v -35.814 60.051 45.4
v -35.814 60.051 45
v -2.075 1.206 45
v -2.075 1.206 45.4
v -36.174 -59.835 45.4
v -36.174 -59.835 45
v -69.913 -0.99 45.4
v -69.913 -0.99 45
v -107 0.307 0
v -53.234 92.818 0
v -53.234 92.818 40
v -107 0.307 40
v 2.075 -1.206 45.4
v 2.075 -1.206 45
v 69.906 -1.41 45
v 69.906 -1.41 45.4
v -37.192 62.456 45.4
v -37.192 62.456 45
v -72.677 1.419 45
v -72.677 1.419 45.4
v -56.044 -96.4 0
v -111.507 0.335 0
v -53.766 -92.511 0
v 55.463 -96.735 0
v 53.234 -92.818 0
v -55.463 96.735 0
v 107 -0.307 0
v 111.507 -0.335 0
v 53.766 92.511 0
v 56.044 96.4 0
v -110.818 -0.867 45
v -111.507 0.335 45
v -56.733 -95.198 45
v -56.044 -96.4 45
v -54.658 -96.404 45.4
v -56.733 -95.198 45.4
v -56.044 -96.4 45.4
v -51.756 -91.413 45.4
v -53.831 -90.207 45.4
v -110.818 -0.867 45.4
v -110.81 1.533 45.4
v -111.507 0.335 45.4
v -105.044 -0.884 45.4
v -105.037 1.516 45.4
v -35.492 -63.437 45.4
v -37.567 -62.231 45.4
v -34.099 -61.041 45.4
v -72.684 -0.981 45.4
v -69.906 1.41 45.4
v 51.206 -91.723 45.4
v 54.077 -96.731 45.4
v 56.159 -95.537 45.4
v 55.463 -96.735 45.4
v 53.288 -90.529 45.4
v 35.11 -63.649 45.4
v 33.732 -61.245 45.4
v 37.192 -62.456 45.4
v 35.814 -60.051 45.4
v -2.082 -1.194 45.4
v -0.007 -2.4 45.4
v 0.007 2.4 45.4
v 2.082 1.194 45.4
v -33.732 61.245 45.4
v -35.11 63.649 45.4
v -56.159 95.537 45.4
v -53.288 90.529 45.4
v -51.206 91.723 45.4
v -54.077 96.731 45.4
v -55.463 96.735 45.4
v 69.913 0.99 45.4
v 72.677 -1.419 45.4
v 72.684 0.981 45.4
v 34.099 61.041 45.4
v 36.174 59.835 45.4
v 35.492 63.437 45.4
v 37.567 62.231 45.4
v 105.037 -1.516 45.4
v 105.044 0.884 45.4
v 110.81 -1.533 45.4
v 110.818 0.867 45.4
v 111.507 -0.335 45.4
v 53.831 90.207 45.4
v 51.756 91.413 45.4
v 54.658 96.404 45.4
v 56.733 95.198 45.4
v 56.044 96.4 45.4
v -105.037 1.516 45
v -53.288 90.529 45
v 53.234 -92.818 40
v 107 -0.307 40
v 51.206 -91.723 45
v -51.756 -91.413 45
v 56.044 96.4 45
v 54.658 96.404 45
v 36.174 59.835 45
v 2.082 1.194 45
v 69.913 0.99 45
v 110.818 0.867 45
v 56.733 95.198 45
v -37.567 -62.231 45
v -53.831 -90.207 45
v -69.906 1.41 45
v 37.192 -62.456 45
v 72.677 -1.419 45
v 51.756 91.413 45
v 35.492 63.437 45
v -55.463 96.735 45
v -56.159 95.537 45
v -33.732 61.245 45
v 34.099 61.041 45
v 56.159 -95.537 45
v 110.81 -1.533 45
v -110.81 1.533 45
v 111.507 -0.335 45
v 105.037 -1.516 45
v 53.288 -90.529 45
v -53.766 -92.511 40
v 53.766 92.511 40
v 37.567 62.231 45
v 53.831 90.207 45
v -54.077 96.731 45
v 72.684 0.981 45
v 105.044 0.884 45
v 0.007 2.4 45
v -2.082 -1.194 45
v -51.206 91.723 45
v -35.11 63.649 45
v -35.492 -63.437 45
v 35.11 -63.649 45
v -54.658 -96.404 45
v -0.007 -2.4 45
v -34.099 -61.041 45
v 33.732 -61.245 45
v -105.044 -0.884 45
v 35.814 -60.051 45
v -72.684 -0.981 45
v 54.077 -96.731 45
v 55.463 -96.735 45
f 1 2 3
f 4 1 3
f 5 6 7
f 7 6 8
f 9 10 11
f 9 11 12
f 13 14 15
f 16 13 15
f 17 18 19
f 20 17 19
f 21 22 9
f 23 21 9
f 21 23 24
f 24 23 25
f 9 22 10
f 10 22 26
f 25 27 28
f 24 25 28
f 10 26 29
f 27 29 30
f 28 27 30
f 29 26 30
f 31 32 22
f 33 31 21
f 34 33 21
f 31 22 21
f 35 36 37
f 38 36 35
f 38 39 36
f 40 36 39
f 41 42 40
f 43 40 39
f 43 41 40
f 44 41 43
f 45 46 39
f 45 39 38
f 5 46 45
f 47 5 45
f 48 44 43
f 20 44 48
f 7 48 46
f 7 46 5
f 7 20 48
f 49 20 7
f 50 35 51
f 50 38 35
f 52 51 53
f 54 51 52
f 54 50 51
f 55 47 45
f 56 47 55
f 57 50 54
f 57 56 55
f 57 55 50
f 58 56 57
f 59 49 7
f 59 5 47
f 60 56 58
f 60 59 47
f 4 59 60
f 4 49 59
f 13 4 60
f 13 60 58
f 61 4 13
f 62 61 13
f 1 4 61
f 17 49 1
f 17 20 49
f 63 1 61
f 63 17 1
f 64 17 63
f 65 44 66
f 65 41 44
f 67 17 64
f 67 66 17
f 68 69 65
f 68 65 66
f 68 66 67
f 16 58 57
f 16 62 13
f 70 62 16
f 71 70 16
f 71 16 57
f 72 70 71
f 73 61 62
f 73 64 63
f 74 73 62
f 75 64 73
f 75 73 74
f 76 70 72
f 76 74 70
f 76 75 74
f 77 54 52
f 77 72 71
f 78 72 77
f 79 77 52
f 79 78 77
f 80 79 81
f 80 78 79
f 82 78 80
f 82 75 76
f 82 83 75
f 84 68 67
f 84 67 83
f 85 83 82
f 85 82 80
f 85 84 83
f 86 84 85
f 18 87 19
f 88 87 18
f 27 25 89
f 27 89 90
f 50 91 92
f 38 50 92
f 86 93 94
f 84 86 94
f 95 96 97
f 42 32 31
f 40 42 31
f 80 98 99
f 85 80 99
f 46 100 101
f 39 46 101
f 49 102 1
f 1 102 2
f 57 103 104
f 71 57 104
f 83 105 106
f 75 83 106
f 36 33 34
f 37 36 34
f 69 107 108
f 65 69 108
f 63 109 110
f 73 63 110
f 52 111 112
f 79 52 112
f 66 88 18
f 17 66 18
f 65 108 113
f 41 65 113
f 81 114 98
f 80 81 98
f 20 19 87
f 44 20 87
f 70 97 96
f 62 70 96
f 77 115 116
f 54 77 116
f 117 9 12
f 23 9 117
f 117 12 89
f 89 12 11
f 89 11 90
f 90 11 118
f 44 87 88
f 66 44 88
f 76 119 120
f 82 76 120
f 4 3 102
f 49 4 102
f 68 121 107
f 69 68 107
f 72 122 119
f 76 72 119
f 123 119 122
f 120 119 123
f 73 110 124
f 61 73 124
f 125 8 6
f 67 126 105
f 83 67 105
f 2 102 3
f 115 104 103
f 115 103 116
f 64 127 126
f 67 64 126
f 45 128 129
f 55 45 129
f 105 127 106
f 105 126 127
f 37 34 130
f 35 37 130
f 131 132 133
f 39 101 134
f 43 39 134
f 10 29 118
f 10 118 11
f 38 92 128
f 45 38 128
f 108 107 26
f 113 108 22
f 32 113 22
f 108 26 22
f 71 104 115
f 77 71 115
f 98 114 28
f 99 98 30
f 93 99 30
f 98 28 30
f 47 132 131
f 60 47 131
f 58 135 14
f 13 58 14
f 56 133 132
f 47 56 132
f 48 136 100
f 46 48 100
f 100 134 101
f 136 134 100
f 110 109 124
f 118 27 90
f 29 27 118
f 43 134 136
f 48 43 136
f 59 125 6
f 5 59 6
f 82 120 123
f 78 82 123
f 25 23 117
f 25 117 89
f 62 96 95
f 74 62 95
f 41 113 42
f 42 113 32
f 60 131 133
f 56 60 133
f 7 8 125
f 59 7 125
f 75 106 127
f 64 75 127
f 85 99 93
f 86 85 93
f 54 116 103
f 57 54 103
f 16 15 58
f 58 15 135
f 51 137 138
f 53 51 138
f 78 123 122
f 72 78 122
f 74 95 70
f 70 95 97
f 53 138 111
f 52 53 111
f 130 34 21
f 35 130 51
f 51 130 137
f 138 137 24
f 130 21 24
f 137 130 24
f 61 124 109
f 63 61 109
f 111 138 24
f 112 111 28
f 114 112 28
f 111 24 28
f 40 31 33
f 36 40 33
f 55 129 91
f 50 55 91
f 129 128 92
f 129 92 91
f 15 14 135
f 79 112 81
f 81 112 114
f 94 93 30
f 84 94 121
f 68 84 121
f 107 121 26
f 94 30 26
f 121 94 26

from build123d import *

# Parameters (mm, degrees)
SALIENTE_EXTRUIR1_DEPTH = 40
SALIENTE_EXTRUIR2_DEPTH = 5
SALIENTE_EXTRUIR3_DEPTH = 0.4


with BuildPart() as part:
    # Croquis1 → Saliente-Extruir1 (new body)
    with BuildSketch(Plane.XY):
        Polygon((-55.463005259, 96.735362128), (-111.506783676, 0.33530954), (-56.043778418, -96.400052588), (55.463005259, -96.735362128), (111.506783676, -0.33530954), (56.043778418, 96.400052588), align=None)
        Polygon((53.766067764, 92.51110391), (-53.233932236, 92.8183325), (-107, 0.30722859), (-53.766067764, -92.51110391), (53.233932236, -92.8183325), (107, -0.30722859), align=None, mode=Mode.SUBTRACT)
    extrude(amount=SALIENTE_EXTRUIR1_DEPTH)

    # Croquis2 → Saliente-Extruir2 (add)
    with BuildSketch(Plane.XY.offset(40)):
        Polygon((111.506783676, -0.33530954), (56.043778418, 96.400052588), (-55.463005259, 96.735362128), (-111.506783676, 0.33530954), (-56.043778418, -96.400052588), (55.463005259, -96.735362128), align=None)
    extrude(amount=SALIENTE_EXTRUIR2_DEPTH)

    # Croquis4 → Saliente-Extruir3 (add)
    with BuildSketch(Plane.XY.offset(45)):
        Polygon((-56.159430926, 95.537450908), (-110.810358009, 1.533220759), (-105.03688142, 1.515859468), (-53.287727951, 90.528792869), align=None)
        Polygon((-111.506783676, 0.33530954), (-110.817574962, -0.86676839), (-105.044098374, -0.884129681), (-105.733307088, 0.317948248), (-105.03688142, 1.515859468), (-110.810358009, 1.533220759), align=None)
        Polygon((-105.044098374, -0.884129681), (-110.817574962, -0.86676839), (-56.732987132, -95.197974658), (-53.831213518, -90.20667791), align=None)
        Polygon((-105.733307088, 0.317948248), (-105.044098374, -0.884129681), (-72.68406869, -0.981438798), (-73.373277404, 0.220639131), (-72.676851737, 1.418550351), (-105.03688142, 1.515859468), align=None)
        Polygon((-55.463005259, 96.735362128), (-56.159430926, 95.537450908), (-53.287727951, 90.528792869), (-52.591302284, 91.726704088), (-51.205667902, 91.722537378), (-54.077370877, 96.731195418), align=None)
        Polygon((54.658144036, 96.404219298), (-54.077370877, 96.731195418), (-51.205667902, 91.722537378), (51.756370423, 91.41292255), align=None)
        Polygon((-52.591302284, 91.726704088), (-53.287727951, 90.528792869), (-37.191985277, 62.455530537), (-36.495559609, 63.653441757), (-35.109925228, 63.649275047), (-51.205667902, 91.722537378), align=None)
        Polygon((56.043778418, 96.400052588), (54.658144036, 96.404219298), (51.756370423, 91.41292255), (53.142004804, 91.40875584), (53.831213518, 90.20667791), (56.732987132, 95.197974658), align=None)
        Polygon((53.142004804, 91.40875584), (51.756370423, 91.41292255), (35.492083414, 63.436969335), (36.877717795, 63.432802625), (37.566926509, 62.230724696), (53.831213518, 90.20667791), align=None)
        Polygon((110.817574962, 0.86676839), (56.732987132, 95.197974658), (53.831213518, 90.20667791), (105.044098374, 0.884129681), align=None)
        Polygon((72.676851737, -1.418550351), (105.03688142, -1.515859468), (105.733307088, -0.317948248), (105.044098374, 0.884129681), (72.68406869, 0.981438798), (73.373277404, -0.220639131), align=None)
        Polygon((105.03688142, -1.515859468), (110.810358009, -1.533220759), (111.506783676, -0.33530954), (110.817574962, 0.86676839), (105.044098374, 0.884129681), (105.733307088, -0.317948248), align=None)
        Polygon((53.287727951, -90.528792869), (56.159430926, -95.537450908), (110.810358009, -1.533220759), (105.03688142, -1.515859468), align=None)
        Polygon((-53.831213518, -90.20667791), (-56.732987132, -95.197974658), (-56.043778418, -96.400052588), (-54.658144036, -96.404219298), (-51.756370423, -91.41292255), (-53.142004804, -91.40875584), align=None)
        Polygon((-51.756370423, -91.41292255), (-54.658144036, -96.404219298), (54.077370877, -96.731195418), (51.205667902, -91.722537378), align=None)
        Polygon((51.205667902, -91.722537378), (54.077370877, -96.731195418), (55.463005259, -96.735362128), (56.159430926, -95.537450908), (53.287727951, -90.528792869), (52.591302284, -91.726704088), align=None)
        Polygon((35.109925228, -63.649275047), (51.205667902, -91.722537378), (52.591302284, -91.726704088), (53.287727951, -90.528792869), (37.191985277, -62.455530537), (36.495559609, -63.653441757), align=None)
        Polygon((-37.566926509, -62.230724696), (-53.831213518, -90.20667791), (-53.142004804, -91.40875584), (-51.756370423, -91.41292255), (-35.492083414, -63.436969335), (-36.877717795, -63.432802625), align=None)
        Polygon((-36.174075174, -59.834902257), (-37.566926509, -62.230724696), (-36.877717795, -63.432802625), (-35.492083414, -63.436969335), (-34.099232079, -61.041146896), (-35.48486646, -61.036980186), align=None)
        Polygon((-34.099232079, -61.041146896), (-35.492083414, -63.436969335), (35.109925228, -63.649275047), (33.7315078, -61.245119188), align=None)
        Polygon((-69.912799928, -0.989772218), (-72.68406869, -0.981438798), (-37.566926509, -62.230724696), (-36.174075174, -59.834902257), align=None)
        Polygon((33.7315078, -61.245119188), (35.109925228, -63.649275047), (36.495559609, -63.653441757), (37.191985277, -62.455530537), (35.813567849, -60.051374678), (35.117142181, -61.249285898), align=None)
        Polygon((2.074843095, -1.206244639), (0.689208714, -1.20207793), (-0.007216953, -2.399989149), (33.7315078, -61.245119188), (35.117142181, -61.249285898), (35.813567849, -60.051374678), align=None)
        Polygon((-0.696425667, -1.19791122), (-2.082060049, -1.19374451), (-36.174075174, -59.834902257), (-35.48486646, -61.036980186), (-34.099232079, -61.041146896), (-0.007216953, -2.399989149), align=None)
        Polygon((72.676851737, -1.418550351), (69.905582974, -1.410216931), (35.813567849, -60.051374678), (37.191985277, -62.455530537), align=None)
        Polygon((70.602008642, -0.212305711), (69.905582974, -1.410216931), (72.676851737, -1.418550351), (73.373277404, -0.220639131), (72.68406869, 0.981438798), (69.912799928, 0.989772218), align=None)
        Polygon((36.174075174, 59.834902257), (69.912799928, 0.989772218), (72.68406869, 0.981438798), (37.566926509, 62.230724696), align=None)
        Polygon((0.689208714, -1.20207793), (-0.696425667, -1.19791122), (-0.007216953, -2.399989149), align=None)
        Polygon((-1.385634381, 0.00416671), (-2.082060049, -1.19374451), (-0.696425667, -1.19791122), align=None)
        Polygon((-1.385634381, 0.00416671), (-0.696425667, -1.19791122), (0.689208714, -1.20207793), (1.385634381, -0.00416671), (0.696425667, 1.19791122), (-0.689208714, 1.20207793), align=None)
        Polygon((-2.074843095, 1.206244639), (-1.385634381, 0.00416671), (-0.689208714, 1.20207793), align=None)
        Polygon((0.007216953, 2.399989149), (-0.689208714, 1.20207793), (0.696425667, 1.19791122), align=None)
        Polygon((0.696425667, 1.19791122), (1.385634381, -0.00416671), (2.082060049, 1.19374451), align=None)
        Polygon((1.385634381, -0.00416671), (0.689208714, -1.20207793), (2.074843095, -1.206244639), align=None)
        Polygon((1.385634381, -0.00416671), (2.074843095, -1.206244639), (69.905582974, -1.410216931), (70.602008642, -0.212305711), (69.912799928, 0.989772218), (2.082060049, 1.19374451), align=None)
        Polygon((-70.602008642, 0.212305711), (-69.912799928, -0.989772218), (-2.082060049, -1.19374451), (-1.385634381, 0.00416671), (-2.074843095, 1.206244639), (-69.905582974, 1.410216931), align=None)
        Polygon((-35.813567849, 60.051374678), (-2.074843095, 1.206244639), (-0.689208714, 1.20207793), (0.007216953, 2.399989149), (-33.7315078, 61.245119188), (-35.117142181, 61.249285898), align=None)
        Polygon((0.007216953, 2.399989149), (0.696425667, 1.19791122), (2.082060049, 1.19374451), (36.174075174, 59.834902257), (35.48486646, 61.036980186), (34.099232079, 61.041146896), align=None)
        Polygon((35.492083414, 63.436969335), (34.099232079, 61.041146896), (35.48486646, 61.036980186), (36.174075174, 59.834902257), (37.566926509, 62.230724696), (36.877717795, 63.432802625), align=None)
        Polygon((35.492083414, 63.436969335), (-35.109925228, 63.649275047), (-33.7315078, 61.245119188), (34.099232079, 61.041146896), align=None)
        Polygon((-36.495559609, 63.653441757), (-37.191985277, 62.455530537), (-35.813567849, 60.051374678), (-35.117142181, 61.249285898), (-33.7315078, 61.245119188), (-35.109925228, 63.649275047), align=None)
        Polygon((-37.191985277, 62.455530537), (-72.676851737, 1.418550351), (-69.905582974, 1.410216931), (-35.813567849, 60.051374678), align=None)
        Polygon((-73.373277404, 0.220639131), (-72.68406869, -0.981438798), (-69.912799928, -0.989772218), (-70.602008642, 0.212305711), (-69.905582974, 1.410216931), (-72.676851737, 1.418550351), align=None)
    extrude(amount=SALIENTE_EXTRUIR3_DEPTH)


solid = part.part
